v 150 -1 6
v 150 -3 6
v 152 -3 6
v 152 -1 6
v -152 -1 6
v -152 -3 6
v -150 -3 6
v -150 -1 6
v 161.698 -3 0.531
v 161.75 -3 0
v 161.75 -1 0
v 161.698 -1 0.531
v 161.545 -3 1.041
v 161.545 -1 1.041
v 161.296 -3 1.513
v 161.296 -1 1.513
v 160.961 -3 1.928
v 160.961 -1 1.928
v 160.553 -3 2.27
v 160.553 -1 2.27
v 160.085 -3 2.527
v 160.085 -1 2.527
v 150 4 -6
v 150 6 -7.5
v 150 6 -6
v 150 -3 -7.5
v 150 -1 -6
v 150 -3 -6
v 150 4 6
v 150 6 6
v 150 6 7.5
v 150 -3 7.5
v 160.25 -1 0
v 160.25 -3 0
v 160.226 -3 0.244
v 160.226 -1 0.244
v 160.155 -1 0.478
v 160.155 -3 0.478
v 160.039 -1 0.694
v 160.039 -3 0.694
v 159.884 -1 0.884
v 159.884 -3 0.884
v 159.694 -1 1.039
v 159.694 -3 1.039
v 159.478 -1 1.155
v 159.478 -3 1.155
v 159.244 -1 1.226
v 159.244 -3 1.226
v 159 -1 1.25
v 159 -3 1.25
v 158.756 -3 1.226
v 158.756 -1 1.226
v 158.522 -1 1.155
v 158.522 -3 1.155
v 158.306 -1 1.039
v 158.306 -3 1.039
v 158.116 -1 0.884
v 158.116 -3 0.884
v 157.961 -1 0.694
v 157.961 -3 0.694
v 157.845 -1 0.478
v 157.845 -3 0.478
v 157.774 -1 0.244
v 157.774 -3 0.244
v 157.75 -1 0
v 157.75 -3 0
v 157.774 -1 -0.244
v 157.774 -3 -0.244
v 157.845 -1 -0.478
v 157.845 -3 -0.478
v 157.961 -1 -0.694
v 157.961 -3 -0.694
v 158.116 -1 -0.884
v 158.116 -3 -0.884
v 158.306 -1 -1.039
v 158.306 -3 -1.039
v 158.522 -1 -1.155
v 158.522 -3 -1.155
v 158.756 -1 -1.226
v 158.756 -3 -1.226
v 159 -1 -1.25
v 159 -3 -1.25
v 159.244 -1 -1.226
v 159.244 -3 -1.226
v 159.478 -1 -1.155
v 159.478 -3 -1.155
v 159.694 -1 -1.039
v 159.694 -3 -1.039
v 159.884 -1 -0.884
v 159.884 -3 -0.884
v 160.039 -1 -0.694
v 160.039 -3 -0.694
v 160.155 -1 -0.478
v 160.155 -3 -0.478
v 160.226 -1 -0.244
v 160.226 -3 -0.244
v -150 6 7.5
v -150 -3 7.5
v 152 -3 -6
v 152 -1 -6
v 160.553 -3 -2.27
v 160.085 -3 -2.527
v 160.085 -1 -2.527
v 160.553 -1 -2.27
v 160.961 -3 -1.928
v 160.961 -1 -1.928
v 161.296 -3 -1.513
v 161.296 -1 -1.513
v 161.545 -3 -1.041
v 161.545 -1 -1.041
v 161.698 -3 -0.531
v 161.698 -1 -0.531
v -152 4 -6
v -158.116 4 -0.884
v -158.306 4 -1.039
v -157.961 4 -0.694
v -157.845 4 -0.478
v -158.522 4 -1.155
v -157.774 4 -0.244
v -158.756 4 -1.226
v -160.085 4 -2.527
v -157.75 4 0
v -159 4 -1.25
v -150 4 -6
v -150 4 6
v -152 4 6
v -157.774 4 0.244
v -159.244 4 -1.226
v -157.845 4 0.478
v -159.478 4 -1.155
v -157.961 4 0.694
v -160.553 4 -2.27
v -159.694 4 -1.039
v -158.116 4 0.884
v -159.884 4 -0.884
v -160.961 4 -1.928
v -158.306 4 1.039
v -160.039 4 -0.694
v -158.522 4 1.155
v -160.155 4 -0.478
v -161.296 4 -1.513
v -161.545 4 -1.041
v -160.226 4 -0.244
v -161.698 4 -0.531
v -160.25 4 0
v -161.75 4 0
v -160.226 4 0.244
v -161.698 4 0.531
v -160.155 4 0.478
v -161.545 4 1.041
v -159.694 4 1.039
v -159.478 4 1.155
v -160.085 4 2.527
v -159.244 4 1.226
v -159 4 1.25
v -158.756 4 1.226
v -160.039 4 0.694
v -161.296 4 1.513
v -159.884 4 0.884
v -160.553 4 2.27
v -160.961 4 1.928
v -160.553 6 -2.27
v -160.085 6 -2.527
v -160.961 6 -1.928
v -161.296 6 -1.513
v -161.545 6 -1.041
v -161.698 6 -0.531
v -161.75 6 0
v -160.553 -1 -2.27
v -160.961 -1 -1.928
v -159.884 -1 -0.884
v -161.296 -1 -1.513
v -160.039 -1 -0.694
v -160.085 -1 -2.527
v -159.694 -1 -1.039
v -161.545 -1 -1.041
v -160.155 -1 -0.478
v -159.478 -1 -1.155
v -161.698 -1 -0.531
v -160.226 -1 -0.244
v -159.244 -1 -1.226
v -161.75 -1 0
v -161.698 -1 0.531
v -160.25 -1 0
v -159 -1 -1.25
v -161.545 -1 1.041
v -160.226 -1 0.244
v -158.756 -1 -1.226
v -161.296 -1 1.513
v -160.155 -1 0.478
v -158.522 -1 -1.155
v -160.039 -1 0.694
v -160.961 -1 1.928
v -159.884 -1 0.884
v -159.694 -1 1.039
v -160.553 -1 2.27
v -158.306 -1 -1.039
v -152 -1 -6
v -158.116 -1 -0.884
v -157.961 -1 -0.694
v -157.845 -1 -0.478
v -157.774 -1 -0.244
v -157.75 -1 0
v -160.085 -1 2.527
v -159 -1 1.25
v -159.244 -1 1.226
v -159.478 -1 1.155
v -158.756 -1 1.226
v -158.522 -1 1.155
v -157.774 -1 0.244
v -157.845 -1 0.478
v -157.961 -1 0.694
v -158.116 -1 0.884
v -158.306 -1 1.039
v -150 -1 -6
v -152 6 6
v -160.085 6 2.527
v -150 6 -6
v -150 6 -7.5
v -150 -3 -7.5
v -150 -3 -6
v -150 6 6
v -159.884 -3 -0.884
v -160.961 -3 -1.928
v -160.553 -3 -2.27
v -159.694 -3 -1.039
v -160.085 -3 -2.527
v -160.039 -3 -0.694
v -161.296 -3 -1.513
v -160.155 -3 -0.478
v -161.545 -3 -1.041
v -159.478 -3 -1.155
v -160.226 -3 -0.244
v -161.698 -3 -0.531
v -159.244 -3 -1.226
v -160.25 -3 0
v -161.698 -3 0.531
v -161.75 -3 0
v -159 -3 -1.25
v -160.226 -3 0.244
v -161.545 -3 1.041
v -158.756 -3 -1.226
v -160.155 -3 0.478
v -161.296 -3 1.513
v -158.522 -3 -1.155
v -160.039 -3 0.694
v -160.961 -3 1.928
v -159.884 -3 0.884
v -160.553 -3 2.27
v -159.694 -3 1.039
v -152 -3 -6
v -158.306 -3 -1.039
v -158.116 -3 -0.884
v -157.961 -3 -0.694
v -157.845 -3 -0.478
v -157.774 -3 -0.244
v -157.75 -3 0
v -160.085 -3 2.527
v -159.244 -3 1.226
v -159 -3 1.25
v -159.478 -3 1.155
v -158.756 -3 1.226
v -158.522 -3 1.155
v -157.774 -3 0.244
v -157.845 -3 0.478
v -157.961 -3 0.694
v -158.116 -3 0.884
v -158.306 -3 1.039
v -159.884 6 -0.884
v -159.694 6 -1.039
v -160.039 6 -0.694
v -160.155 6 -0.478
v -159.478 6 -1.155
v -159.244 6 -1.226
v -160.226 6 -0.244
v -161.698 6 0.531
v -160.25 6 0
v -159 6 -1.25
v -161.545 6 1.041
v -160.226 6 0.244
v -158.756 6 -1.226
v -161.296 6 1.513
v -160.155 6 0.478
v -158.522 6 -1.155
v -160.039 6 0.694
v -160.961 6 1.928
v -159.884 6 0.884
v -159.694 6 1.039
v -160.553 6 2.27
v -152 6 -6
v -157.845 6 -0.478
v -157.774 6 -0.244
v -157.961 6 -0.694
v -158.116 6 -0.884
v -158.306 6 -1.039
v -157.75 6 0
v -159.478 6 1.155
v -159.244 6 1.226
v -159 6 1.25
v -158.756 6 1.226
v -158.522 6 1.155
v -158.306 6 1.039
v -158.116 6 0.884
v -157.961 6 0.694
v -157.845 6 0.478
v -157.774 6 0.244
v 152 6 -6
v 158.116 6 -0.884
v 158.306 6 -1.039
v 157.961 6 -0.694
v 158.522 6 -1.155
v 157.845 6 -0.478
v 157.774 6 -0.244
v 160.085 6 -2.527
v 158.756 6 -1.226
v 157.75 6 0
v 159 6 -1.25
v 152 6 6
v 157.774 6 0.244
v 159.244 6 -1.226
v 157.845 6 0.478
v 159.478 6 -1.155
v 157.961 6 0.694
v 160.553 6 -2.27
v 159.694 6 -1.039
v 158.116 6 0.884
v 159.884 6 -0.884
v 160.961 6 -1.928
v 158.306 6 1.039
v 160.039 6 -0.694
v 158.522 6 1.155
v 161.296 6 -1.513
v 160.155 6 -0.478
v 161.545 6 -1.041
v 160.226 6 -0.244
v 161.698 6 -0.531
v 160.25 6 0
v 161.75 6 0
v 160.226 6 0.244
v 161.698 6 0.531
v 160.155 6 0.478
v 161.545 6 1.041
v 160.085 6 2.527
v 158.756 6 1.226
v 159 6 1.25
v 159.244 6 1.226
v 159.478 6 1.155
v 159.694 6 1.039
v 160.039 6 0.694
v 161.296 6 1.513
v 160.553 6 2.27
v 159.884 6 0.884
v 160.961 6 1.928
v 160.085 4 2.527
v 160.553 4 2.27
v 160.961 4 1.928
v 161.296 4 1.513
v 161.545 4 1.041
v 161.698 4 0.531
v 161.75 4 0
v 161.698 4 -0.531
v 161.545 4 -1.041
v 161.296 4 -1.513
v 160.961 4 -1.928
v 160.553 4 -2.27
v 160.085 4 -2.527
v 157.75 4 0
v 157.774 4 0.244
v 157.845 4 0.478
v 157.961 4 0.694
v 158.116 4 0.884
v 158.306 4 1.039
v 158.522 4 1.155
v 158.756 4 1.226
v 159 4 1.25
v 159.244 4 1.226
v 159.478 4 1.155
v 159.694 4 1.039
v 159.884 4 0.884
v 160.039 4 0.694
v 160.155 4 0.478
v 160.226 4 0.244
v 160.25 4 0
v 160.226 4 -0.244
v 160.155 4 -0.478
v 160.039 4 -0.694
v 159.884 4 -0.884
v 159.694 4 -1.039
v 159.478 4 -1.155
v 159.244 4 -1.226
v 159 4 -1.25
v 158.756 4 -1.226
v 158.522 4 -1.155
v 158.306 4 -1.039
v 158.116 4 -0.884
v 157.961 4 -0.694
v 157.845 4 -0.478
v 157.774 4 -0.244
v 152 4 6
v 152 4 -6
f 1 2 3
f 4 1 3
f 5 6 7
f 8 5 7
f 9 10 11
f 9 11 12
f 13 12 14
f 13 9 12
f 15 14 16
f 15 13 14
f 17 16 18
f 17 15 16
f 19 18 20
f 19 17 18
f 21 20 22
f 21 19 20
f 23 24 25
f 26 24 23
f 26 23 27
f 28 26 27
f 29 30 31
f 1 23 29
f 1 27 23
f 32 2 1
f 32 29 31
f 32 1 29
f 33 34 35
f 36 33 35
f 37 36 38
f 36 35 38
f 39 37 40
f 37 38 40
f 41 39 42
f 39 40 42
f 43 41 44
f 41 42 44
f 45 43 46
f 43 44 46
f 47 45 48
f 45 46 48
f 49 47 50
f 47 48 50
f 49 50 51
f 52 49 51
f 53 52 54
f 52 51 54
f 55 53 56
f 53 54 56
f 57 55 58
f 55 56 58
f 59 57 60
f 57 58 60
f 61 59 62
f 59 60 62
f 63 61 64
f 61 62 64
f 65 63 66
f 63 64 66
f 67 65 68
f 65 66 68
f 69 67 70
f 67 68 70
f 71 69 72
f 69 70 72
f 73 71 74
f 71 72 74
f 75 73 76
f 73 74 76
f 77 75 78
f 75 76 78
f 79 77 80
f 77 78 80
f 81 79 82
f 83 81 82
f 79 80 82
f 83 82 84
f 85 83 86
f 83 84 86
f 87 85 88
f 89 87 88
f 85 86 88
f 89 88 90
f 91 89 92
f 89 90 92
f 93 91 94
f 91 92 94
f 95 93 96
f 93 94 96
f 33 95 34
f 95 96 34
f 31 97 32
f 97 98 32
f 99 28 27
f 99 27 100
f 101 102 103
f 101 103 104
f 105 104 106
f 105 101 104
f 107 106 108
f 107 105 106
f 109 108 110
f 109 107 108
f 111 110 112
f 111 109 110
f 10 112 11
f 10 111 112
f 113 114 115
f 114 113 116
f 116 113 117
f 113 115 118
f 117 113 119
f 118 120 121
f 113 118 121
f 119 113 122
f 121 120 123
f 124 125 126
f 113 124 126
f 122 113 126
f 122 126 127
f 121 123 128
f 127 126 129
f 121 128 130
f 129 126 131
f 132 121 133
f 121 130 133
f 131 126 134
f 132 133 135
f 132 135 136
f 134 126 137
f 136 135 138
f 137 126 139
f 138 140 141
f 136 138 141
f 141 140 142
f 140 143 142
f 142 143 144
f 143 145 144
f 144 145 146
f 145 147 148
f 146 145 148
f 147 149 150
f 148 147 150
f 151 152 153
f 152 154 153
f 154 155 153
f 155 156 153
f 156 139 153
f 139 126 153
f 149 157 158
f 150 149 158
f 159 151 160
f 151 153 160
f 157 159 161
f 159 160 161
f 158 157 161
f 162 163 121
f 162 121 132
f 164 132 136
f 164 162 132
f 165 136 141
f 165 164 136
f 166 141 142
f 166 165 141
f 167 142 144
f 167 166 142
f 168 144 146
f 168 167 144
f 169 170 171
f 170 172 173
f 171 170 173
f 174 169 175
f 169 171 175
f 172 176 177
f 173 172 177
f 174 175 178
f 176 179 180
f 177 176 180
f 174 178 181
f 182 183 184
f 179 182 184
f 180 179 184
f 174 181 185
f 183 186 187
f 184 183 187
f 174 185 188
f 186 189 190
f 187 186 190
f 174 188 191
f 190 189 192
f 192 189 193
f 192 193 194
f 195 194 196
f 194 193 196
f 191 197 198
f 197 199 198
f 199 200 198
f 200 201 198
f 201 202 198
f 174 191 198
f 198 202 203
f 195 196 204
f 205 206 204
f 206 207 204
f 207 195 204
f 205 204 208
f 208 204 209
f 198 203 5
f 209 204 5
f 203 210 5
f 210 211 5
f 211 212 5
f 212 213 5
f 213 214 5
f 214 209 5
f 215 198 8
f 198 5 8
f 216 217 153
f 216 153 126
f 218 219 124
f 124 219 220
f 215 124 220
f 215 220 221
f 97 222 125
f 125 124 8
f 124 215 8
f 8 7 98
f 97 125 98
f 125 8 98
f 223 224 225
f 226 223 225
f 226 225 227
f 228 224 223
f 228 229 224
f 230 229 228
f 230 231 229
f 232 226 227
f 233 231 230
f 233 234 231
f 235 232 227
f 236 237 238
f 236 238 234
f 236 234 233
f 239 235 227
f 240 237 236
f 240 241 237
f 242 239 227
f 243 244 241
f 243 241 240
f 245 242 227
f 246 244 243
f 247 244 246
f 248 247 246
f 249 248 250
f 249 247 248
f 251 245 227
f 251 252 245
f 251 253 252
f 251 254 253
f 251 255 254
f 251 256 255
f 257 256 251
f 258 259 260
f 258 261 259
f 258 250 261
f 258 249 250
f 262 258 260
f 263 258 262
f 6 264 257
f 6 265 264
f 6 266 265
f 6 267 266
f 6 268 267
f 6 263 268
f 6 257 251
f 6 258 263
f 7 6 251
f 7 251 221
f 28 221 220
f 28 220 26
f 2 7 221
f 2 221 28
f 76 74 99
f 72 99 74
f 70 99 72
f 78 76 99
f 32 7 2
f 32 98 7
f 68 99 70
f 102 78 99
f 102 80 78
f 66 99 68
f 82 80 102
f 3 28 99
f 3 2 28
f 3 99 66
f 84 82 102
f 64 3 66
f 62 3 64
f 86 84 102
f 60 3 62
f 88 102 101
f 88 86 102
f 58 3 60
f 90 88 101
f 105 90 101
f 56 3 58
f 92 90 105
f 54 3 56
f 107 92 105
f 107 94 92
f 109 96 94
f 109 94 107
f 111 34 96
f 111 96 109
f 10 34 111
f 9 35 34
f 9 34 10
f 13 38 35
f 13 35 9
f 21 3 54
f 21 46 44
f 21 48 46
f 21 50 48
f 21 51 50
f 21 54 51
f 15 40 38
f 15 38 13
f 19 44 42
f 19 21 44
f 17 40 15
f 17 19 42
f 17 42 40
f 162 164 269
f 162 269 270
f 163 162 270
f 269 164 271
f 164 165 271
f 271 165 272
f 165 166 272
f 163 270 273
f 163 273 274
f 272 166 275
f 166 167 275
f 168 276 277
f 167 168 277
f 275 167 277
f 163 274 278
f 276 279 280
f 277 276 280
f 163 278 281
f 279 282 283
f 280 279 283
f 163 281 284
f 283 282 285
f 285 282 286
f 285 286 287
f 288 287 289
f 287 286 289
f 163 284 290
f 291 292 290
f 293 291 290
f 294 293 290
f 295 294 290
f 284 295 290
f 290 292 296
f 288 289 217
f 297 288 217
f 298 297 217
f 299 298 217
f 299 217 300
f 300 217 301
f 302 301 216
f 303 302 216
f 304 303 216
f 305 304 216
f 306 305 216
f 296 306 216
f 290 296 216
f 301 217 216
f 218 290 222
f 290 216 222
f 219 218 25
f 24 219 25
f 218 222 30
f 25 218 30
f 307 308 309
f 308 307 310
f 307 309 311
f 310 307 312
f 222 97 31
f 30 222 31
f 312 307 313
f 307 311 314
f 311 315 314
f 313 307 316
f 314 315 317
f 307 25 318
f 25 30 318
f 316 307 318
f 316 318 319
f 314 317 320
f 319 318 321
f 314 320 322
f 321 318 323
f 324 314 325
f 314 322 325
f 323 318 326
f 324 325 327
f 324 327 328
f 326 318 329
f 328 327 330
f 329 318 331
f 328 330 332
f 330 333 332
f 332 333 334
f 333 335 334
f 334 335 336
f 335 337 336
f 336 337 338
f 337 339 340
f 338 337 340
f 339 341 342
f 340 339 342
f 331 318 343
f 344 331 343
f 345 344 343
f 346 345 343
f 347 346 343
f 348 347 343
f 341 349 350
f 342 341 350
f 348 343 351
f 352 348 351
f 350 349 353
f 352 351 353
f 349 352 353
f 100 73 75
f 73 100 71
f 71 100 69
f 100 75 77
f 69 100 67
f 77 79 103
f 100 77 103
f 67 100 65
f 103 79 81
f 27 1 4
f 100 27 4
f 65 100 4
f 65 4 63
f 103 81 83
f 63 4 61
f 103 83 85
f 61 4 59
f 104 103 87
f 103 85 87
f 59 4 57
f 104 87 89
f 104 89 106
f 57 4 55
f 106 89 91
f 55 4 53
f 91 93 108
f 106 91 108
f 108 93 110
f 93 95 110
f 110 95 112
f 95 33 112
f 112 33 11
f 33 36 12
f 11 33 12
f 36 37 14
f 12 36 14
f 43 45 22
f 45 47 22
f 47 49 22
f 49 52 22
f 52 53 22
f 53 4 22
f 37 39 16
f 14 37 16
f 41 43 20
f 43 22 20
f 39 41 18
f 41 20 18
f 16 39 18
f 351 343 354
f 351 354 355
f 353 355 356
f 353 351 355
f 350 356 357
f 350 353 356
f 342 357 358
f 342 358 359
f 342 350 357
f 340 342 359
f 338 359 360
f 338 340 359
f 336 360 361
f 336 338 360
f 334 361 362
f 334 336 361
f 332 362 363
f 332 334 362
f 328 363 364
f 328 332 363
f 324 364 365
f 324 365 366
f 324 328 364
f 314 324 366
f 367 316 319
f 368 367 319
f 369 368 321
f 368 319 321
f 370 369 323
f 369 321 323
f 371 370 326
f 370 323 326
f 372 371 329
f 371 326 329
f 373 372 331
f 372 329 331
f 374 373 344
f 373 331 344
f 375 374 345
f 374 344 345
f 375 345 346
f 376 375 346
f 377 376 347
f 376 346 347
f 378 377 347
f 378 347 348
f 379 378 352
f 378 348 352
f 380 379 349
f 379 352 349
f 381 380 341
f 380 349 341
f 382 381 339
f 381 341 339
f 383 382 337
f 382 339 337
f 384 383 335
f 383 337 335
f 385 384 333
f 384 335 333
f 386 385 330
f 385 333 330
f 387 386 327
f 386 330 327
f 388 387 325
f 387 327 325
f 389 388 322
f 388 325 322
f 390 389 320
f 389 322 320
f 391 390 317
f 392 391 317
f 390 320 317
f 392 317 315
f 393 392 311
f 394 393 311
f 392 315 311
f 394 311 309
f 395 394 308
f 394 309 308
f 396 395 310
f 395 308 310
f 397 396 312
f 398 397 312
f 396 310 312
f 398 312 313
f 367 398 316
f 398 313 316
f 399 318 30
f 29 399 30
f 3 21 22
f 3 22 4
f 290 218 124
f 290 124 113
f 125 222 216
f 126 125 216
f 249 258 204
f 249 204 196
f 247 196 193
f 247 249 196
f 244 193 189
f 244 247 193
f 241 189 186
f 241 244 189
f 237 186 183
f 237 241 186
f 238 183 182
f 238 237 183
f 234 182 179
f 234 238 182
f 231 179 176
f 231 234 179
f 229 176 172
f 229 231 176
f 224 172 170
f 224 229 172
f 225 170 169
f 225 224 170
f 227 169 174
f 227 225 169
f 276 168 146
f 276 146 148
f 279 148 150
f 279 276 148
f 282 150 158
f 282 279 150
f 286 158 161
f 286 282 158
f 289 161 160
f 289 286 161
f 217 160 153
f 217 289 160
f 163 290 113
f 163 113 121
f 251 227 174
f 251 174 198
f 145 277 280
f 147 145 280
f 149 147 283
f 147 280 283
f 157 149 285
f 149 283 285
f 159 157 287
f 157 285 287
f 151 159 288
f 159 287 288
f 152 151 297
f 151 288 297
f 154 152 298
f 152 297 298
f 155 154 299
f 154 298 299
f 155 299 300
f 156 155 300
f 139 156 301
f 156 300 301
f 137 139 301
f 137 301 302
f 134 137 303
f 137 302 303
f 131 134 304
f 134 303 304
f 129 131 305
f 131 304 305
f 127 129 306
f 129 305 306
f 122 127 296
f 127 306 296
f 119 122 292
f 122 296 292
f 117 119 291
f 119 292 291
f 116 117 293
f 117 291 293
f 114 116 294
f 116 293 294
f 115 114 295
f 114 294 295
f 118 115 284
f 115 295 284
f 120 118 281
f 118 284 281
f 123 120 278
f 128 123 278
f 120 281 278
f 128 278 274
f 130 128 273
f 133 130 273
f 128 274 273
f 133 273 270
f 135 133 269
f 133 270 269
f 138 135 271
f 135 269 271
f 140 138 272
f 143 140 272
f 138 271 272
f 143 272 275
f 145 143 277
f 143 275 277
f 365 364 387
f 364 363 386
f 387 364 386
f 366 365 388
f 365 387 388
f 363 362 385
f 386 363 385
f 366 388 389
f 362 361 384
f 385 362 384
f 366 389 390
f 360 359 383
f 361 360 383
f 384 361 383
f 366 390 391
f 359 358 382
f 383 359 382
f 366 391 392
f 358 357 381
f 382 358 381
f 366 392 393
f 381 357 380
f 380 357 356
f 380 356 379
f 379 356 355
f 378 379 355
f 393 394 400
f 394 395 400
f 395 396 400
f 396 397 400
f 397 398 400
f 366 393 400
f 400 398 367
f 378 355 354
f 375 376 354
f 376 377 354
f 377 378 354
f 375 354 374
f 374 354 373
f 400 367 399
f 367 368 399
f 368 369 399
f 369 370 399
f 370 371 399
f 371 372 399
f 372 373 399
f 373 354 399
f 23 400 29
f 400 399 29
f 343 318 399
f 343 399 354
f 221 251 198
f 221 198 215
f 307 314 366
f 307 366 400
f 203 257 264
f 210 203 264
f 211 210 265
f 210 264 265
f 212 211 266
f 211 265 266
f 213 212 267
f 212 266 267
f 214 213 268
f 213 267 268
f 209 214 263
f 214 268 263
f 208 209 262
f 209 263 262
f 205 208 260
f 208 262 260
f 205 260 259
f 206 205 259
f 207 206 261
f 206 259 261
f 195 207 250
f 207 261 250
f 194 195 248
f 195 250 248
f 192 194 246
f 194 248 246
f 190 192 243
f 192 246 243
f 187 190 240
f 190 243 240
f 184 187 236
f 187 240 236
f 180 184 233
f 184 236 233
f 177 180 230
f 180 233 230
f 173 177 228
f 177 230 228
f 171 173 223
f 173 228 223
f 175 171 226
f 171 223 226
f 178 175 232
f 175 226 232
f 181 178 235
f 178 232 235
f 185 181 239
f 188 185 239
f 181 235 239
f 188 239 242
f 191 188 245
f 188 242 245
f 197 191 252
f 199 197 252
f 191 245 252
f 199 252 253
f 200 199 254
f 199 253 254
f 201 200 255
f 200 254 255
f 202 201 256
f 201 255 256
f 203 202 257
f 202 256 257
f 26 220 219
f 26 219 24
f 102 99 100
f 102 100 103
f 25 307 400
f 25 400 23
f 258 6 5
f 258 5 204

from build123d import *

# Parameters (mm, degrees)
F0_W     = 300
F0_H     = 15
F1_DEPTH = 3
F2_DEPTH = 6
F3_R     = 1.25
F3_W     = 2
F3_H     = 12
F5_DEPTH = 2
F4_W     = 2
F4_H     = 12
F4_R     = 1.25
F6_DEPTH = 2


with BuildPart() as f1:
    # F0 (on Front) → F1 (new body)
    with BuildSketch(Plane.XZ):
        Rectangle(F0_W, F0_H)
    extrude(amount=F1_DEPTH)

    # F0 (on Front) → F2 (join)
    with BuildSketch(Plane.XZ):
        Rectangle(F0_W, F0_H)
    extrude(amount=-F2_DEPTH)

    # F3 (on face) → F5 (join)
    with BuildSketch(Plane.XZ.offset(3)):
        with BuildLine():
            ThreePointArc((-156.25, 0), (-157.48712, 2.296452), (-160.085414, 2.526733))
            ThreePointArc((-160.085414, 2.526733), (-161.75, 0), (-160.085414, -2.526733))
            ThreePointArc((-160.085414, -2.526733), (-157.48712, -2.296452), (-156.25, 0))
        make_face()
        with Locations((-159, 0)):
            Circle(F3_R, mode=Mode.SUBTRACT)
        with BuildLine():
            Line((-152, -6), (-152, 6))
            Line((-152, 6), (-160.085414, 2.526733))
            ThreePointArc((-160.085414, 2.526733), (-157.48712, 2.296452), (-156.25, 0))
            ThreePointArc((-156.25, 0), (-157.48712, -2.296452), (-160.085414, -2.526733))
            Line((-160.085414, -2.526733), (-152, -6))
        make_face()
        with Locations((-151, 0)):
            Rectangle(F3_W, F3_H)
        with Locations((151, 0)):
            Rectangle(F3_W, F3_H)
        with BuildLine():
            ThreePointArc((160.085414, -2.526733), (156.25, 0), (160.085414, 2.526733))
            Line((160.085414, 2.526733), (152, 6))
            Line((152, 6), (152, -6))
            Line((152, -6), (160.085414, -2.526733))
        make_face()
        with BuildLine():
            ThreePointArc((160.085414, -2.526733), (161.296452, -1.51288), (161.75, 0))
            ThreePointArc((161.75, 0), (161.296452, 1.51288), (160.085414, 2.526733))
            ThreePointArc((160.085414, 2.526733), (156.25, 0), (160.085414, -2.526733))
        make_face()
        with Locations((159, 0)):
            Circle(F3_R, mode=Mode.SUBTRACT)
    extrude(amount=-F5_DEPTH)

    # F4 (on face) → F6 (join)
    with BuildSketch(Plane(origin=(0, 6, 0), x_dir=(-1, 0, 0), z_dir=(0, 1, 0))):
        with BuildLine():
            Line((-152, -6), (-152, 6))
            Line((-152, 6), (-160.085414, 2.526733))
            ThreePointArc((-160.085414, 2.526733), (-157.48712, 2.296452), (-156.25, 0))
            ThreePointArc((-156.25, 0), (-157.48712, -2.296452), (-160.085414, -2.526733))
            Line((-160.085414, -2.526733), (-152, -6))
        make_face()
        with Locations((-151, 0)):
            Rectangle(F4_W, F4_H)
        with BuildLine():
            ThreePointArc((-156.25, 0), (-157.48712, 2.296452), (-160.085414, 2.526733))
            ThreePointArc((-160.085414, 2.526733), (-161.75, 0), (-160.085414, -2.526733))
            ThreePointArc((-160.085414, -2.526733), (-157.48712, -2.296452), (-156.25, 0))
        make_face()
        with Locations((-159, 0)):
            Circle(F4_R, mode=Mode.SUBTRACT)
        with Locations((151, 0)):
            Rectangle(F4_W, F4_H)
        with BuildLine():
            ThreePointArc((160.085414, -2.526733), (156.25, 0), (160.085414, 2.526733))
            Line((160.085414, 2.526733), (152, 6))
            Line((152, 6), (152, -6))
            Line((152, -6), (160.085414, -2.526733))
        make_face()
        with BuildLine():
            ThreePointArc((160.085414, -2.526733), (161.296452, -1.51288), (161.75, 0))
            ThreePointArc((161.75, 0), (161.296452, 1.51288), (160.085414, 2.526733))
            ThreePointArc((160.085414, 2.526733), (156.25, 0), (160.085414, -2.526733))
        make_face()
        with Locations((159, 0)):
            Circle(F4_R, mode=Mode.SUBTRACT)
    extrude(amount=-F6_DEPTH)


solid = f1.part
